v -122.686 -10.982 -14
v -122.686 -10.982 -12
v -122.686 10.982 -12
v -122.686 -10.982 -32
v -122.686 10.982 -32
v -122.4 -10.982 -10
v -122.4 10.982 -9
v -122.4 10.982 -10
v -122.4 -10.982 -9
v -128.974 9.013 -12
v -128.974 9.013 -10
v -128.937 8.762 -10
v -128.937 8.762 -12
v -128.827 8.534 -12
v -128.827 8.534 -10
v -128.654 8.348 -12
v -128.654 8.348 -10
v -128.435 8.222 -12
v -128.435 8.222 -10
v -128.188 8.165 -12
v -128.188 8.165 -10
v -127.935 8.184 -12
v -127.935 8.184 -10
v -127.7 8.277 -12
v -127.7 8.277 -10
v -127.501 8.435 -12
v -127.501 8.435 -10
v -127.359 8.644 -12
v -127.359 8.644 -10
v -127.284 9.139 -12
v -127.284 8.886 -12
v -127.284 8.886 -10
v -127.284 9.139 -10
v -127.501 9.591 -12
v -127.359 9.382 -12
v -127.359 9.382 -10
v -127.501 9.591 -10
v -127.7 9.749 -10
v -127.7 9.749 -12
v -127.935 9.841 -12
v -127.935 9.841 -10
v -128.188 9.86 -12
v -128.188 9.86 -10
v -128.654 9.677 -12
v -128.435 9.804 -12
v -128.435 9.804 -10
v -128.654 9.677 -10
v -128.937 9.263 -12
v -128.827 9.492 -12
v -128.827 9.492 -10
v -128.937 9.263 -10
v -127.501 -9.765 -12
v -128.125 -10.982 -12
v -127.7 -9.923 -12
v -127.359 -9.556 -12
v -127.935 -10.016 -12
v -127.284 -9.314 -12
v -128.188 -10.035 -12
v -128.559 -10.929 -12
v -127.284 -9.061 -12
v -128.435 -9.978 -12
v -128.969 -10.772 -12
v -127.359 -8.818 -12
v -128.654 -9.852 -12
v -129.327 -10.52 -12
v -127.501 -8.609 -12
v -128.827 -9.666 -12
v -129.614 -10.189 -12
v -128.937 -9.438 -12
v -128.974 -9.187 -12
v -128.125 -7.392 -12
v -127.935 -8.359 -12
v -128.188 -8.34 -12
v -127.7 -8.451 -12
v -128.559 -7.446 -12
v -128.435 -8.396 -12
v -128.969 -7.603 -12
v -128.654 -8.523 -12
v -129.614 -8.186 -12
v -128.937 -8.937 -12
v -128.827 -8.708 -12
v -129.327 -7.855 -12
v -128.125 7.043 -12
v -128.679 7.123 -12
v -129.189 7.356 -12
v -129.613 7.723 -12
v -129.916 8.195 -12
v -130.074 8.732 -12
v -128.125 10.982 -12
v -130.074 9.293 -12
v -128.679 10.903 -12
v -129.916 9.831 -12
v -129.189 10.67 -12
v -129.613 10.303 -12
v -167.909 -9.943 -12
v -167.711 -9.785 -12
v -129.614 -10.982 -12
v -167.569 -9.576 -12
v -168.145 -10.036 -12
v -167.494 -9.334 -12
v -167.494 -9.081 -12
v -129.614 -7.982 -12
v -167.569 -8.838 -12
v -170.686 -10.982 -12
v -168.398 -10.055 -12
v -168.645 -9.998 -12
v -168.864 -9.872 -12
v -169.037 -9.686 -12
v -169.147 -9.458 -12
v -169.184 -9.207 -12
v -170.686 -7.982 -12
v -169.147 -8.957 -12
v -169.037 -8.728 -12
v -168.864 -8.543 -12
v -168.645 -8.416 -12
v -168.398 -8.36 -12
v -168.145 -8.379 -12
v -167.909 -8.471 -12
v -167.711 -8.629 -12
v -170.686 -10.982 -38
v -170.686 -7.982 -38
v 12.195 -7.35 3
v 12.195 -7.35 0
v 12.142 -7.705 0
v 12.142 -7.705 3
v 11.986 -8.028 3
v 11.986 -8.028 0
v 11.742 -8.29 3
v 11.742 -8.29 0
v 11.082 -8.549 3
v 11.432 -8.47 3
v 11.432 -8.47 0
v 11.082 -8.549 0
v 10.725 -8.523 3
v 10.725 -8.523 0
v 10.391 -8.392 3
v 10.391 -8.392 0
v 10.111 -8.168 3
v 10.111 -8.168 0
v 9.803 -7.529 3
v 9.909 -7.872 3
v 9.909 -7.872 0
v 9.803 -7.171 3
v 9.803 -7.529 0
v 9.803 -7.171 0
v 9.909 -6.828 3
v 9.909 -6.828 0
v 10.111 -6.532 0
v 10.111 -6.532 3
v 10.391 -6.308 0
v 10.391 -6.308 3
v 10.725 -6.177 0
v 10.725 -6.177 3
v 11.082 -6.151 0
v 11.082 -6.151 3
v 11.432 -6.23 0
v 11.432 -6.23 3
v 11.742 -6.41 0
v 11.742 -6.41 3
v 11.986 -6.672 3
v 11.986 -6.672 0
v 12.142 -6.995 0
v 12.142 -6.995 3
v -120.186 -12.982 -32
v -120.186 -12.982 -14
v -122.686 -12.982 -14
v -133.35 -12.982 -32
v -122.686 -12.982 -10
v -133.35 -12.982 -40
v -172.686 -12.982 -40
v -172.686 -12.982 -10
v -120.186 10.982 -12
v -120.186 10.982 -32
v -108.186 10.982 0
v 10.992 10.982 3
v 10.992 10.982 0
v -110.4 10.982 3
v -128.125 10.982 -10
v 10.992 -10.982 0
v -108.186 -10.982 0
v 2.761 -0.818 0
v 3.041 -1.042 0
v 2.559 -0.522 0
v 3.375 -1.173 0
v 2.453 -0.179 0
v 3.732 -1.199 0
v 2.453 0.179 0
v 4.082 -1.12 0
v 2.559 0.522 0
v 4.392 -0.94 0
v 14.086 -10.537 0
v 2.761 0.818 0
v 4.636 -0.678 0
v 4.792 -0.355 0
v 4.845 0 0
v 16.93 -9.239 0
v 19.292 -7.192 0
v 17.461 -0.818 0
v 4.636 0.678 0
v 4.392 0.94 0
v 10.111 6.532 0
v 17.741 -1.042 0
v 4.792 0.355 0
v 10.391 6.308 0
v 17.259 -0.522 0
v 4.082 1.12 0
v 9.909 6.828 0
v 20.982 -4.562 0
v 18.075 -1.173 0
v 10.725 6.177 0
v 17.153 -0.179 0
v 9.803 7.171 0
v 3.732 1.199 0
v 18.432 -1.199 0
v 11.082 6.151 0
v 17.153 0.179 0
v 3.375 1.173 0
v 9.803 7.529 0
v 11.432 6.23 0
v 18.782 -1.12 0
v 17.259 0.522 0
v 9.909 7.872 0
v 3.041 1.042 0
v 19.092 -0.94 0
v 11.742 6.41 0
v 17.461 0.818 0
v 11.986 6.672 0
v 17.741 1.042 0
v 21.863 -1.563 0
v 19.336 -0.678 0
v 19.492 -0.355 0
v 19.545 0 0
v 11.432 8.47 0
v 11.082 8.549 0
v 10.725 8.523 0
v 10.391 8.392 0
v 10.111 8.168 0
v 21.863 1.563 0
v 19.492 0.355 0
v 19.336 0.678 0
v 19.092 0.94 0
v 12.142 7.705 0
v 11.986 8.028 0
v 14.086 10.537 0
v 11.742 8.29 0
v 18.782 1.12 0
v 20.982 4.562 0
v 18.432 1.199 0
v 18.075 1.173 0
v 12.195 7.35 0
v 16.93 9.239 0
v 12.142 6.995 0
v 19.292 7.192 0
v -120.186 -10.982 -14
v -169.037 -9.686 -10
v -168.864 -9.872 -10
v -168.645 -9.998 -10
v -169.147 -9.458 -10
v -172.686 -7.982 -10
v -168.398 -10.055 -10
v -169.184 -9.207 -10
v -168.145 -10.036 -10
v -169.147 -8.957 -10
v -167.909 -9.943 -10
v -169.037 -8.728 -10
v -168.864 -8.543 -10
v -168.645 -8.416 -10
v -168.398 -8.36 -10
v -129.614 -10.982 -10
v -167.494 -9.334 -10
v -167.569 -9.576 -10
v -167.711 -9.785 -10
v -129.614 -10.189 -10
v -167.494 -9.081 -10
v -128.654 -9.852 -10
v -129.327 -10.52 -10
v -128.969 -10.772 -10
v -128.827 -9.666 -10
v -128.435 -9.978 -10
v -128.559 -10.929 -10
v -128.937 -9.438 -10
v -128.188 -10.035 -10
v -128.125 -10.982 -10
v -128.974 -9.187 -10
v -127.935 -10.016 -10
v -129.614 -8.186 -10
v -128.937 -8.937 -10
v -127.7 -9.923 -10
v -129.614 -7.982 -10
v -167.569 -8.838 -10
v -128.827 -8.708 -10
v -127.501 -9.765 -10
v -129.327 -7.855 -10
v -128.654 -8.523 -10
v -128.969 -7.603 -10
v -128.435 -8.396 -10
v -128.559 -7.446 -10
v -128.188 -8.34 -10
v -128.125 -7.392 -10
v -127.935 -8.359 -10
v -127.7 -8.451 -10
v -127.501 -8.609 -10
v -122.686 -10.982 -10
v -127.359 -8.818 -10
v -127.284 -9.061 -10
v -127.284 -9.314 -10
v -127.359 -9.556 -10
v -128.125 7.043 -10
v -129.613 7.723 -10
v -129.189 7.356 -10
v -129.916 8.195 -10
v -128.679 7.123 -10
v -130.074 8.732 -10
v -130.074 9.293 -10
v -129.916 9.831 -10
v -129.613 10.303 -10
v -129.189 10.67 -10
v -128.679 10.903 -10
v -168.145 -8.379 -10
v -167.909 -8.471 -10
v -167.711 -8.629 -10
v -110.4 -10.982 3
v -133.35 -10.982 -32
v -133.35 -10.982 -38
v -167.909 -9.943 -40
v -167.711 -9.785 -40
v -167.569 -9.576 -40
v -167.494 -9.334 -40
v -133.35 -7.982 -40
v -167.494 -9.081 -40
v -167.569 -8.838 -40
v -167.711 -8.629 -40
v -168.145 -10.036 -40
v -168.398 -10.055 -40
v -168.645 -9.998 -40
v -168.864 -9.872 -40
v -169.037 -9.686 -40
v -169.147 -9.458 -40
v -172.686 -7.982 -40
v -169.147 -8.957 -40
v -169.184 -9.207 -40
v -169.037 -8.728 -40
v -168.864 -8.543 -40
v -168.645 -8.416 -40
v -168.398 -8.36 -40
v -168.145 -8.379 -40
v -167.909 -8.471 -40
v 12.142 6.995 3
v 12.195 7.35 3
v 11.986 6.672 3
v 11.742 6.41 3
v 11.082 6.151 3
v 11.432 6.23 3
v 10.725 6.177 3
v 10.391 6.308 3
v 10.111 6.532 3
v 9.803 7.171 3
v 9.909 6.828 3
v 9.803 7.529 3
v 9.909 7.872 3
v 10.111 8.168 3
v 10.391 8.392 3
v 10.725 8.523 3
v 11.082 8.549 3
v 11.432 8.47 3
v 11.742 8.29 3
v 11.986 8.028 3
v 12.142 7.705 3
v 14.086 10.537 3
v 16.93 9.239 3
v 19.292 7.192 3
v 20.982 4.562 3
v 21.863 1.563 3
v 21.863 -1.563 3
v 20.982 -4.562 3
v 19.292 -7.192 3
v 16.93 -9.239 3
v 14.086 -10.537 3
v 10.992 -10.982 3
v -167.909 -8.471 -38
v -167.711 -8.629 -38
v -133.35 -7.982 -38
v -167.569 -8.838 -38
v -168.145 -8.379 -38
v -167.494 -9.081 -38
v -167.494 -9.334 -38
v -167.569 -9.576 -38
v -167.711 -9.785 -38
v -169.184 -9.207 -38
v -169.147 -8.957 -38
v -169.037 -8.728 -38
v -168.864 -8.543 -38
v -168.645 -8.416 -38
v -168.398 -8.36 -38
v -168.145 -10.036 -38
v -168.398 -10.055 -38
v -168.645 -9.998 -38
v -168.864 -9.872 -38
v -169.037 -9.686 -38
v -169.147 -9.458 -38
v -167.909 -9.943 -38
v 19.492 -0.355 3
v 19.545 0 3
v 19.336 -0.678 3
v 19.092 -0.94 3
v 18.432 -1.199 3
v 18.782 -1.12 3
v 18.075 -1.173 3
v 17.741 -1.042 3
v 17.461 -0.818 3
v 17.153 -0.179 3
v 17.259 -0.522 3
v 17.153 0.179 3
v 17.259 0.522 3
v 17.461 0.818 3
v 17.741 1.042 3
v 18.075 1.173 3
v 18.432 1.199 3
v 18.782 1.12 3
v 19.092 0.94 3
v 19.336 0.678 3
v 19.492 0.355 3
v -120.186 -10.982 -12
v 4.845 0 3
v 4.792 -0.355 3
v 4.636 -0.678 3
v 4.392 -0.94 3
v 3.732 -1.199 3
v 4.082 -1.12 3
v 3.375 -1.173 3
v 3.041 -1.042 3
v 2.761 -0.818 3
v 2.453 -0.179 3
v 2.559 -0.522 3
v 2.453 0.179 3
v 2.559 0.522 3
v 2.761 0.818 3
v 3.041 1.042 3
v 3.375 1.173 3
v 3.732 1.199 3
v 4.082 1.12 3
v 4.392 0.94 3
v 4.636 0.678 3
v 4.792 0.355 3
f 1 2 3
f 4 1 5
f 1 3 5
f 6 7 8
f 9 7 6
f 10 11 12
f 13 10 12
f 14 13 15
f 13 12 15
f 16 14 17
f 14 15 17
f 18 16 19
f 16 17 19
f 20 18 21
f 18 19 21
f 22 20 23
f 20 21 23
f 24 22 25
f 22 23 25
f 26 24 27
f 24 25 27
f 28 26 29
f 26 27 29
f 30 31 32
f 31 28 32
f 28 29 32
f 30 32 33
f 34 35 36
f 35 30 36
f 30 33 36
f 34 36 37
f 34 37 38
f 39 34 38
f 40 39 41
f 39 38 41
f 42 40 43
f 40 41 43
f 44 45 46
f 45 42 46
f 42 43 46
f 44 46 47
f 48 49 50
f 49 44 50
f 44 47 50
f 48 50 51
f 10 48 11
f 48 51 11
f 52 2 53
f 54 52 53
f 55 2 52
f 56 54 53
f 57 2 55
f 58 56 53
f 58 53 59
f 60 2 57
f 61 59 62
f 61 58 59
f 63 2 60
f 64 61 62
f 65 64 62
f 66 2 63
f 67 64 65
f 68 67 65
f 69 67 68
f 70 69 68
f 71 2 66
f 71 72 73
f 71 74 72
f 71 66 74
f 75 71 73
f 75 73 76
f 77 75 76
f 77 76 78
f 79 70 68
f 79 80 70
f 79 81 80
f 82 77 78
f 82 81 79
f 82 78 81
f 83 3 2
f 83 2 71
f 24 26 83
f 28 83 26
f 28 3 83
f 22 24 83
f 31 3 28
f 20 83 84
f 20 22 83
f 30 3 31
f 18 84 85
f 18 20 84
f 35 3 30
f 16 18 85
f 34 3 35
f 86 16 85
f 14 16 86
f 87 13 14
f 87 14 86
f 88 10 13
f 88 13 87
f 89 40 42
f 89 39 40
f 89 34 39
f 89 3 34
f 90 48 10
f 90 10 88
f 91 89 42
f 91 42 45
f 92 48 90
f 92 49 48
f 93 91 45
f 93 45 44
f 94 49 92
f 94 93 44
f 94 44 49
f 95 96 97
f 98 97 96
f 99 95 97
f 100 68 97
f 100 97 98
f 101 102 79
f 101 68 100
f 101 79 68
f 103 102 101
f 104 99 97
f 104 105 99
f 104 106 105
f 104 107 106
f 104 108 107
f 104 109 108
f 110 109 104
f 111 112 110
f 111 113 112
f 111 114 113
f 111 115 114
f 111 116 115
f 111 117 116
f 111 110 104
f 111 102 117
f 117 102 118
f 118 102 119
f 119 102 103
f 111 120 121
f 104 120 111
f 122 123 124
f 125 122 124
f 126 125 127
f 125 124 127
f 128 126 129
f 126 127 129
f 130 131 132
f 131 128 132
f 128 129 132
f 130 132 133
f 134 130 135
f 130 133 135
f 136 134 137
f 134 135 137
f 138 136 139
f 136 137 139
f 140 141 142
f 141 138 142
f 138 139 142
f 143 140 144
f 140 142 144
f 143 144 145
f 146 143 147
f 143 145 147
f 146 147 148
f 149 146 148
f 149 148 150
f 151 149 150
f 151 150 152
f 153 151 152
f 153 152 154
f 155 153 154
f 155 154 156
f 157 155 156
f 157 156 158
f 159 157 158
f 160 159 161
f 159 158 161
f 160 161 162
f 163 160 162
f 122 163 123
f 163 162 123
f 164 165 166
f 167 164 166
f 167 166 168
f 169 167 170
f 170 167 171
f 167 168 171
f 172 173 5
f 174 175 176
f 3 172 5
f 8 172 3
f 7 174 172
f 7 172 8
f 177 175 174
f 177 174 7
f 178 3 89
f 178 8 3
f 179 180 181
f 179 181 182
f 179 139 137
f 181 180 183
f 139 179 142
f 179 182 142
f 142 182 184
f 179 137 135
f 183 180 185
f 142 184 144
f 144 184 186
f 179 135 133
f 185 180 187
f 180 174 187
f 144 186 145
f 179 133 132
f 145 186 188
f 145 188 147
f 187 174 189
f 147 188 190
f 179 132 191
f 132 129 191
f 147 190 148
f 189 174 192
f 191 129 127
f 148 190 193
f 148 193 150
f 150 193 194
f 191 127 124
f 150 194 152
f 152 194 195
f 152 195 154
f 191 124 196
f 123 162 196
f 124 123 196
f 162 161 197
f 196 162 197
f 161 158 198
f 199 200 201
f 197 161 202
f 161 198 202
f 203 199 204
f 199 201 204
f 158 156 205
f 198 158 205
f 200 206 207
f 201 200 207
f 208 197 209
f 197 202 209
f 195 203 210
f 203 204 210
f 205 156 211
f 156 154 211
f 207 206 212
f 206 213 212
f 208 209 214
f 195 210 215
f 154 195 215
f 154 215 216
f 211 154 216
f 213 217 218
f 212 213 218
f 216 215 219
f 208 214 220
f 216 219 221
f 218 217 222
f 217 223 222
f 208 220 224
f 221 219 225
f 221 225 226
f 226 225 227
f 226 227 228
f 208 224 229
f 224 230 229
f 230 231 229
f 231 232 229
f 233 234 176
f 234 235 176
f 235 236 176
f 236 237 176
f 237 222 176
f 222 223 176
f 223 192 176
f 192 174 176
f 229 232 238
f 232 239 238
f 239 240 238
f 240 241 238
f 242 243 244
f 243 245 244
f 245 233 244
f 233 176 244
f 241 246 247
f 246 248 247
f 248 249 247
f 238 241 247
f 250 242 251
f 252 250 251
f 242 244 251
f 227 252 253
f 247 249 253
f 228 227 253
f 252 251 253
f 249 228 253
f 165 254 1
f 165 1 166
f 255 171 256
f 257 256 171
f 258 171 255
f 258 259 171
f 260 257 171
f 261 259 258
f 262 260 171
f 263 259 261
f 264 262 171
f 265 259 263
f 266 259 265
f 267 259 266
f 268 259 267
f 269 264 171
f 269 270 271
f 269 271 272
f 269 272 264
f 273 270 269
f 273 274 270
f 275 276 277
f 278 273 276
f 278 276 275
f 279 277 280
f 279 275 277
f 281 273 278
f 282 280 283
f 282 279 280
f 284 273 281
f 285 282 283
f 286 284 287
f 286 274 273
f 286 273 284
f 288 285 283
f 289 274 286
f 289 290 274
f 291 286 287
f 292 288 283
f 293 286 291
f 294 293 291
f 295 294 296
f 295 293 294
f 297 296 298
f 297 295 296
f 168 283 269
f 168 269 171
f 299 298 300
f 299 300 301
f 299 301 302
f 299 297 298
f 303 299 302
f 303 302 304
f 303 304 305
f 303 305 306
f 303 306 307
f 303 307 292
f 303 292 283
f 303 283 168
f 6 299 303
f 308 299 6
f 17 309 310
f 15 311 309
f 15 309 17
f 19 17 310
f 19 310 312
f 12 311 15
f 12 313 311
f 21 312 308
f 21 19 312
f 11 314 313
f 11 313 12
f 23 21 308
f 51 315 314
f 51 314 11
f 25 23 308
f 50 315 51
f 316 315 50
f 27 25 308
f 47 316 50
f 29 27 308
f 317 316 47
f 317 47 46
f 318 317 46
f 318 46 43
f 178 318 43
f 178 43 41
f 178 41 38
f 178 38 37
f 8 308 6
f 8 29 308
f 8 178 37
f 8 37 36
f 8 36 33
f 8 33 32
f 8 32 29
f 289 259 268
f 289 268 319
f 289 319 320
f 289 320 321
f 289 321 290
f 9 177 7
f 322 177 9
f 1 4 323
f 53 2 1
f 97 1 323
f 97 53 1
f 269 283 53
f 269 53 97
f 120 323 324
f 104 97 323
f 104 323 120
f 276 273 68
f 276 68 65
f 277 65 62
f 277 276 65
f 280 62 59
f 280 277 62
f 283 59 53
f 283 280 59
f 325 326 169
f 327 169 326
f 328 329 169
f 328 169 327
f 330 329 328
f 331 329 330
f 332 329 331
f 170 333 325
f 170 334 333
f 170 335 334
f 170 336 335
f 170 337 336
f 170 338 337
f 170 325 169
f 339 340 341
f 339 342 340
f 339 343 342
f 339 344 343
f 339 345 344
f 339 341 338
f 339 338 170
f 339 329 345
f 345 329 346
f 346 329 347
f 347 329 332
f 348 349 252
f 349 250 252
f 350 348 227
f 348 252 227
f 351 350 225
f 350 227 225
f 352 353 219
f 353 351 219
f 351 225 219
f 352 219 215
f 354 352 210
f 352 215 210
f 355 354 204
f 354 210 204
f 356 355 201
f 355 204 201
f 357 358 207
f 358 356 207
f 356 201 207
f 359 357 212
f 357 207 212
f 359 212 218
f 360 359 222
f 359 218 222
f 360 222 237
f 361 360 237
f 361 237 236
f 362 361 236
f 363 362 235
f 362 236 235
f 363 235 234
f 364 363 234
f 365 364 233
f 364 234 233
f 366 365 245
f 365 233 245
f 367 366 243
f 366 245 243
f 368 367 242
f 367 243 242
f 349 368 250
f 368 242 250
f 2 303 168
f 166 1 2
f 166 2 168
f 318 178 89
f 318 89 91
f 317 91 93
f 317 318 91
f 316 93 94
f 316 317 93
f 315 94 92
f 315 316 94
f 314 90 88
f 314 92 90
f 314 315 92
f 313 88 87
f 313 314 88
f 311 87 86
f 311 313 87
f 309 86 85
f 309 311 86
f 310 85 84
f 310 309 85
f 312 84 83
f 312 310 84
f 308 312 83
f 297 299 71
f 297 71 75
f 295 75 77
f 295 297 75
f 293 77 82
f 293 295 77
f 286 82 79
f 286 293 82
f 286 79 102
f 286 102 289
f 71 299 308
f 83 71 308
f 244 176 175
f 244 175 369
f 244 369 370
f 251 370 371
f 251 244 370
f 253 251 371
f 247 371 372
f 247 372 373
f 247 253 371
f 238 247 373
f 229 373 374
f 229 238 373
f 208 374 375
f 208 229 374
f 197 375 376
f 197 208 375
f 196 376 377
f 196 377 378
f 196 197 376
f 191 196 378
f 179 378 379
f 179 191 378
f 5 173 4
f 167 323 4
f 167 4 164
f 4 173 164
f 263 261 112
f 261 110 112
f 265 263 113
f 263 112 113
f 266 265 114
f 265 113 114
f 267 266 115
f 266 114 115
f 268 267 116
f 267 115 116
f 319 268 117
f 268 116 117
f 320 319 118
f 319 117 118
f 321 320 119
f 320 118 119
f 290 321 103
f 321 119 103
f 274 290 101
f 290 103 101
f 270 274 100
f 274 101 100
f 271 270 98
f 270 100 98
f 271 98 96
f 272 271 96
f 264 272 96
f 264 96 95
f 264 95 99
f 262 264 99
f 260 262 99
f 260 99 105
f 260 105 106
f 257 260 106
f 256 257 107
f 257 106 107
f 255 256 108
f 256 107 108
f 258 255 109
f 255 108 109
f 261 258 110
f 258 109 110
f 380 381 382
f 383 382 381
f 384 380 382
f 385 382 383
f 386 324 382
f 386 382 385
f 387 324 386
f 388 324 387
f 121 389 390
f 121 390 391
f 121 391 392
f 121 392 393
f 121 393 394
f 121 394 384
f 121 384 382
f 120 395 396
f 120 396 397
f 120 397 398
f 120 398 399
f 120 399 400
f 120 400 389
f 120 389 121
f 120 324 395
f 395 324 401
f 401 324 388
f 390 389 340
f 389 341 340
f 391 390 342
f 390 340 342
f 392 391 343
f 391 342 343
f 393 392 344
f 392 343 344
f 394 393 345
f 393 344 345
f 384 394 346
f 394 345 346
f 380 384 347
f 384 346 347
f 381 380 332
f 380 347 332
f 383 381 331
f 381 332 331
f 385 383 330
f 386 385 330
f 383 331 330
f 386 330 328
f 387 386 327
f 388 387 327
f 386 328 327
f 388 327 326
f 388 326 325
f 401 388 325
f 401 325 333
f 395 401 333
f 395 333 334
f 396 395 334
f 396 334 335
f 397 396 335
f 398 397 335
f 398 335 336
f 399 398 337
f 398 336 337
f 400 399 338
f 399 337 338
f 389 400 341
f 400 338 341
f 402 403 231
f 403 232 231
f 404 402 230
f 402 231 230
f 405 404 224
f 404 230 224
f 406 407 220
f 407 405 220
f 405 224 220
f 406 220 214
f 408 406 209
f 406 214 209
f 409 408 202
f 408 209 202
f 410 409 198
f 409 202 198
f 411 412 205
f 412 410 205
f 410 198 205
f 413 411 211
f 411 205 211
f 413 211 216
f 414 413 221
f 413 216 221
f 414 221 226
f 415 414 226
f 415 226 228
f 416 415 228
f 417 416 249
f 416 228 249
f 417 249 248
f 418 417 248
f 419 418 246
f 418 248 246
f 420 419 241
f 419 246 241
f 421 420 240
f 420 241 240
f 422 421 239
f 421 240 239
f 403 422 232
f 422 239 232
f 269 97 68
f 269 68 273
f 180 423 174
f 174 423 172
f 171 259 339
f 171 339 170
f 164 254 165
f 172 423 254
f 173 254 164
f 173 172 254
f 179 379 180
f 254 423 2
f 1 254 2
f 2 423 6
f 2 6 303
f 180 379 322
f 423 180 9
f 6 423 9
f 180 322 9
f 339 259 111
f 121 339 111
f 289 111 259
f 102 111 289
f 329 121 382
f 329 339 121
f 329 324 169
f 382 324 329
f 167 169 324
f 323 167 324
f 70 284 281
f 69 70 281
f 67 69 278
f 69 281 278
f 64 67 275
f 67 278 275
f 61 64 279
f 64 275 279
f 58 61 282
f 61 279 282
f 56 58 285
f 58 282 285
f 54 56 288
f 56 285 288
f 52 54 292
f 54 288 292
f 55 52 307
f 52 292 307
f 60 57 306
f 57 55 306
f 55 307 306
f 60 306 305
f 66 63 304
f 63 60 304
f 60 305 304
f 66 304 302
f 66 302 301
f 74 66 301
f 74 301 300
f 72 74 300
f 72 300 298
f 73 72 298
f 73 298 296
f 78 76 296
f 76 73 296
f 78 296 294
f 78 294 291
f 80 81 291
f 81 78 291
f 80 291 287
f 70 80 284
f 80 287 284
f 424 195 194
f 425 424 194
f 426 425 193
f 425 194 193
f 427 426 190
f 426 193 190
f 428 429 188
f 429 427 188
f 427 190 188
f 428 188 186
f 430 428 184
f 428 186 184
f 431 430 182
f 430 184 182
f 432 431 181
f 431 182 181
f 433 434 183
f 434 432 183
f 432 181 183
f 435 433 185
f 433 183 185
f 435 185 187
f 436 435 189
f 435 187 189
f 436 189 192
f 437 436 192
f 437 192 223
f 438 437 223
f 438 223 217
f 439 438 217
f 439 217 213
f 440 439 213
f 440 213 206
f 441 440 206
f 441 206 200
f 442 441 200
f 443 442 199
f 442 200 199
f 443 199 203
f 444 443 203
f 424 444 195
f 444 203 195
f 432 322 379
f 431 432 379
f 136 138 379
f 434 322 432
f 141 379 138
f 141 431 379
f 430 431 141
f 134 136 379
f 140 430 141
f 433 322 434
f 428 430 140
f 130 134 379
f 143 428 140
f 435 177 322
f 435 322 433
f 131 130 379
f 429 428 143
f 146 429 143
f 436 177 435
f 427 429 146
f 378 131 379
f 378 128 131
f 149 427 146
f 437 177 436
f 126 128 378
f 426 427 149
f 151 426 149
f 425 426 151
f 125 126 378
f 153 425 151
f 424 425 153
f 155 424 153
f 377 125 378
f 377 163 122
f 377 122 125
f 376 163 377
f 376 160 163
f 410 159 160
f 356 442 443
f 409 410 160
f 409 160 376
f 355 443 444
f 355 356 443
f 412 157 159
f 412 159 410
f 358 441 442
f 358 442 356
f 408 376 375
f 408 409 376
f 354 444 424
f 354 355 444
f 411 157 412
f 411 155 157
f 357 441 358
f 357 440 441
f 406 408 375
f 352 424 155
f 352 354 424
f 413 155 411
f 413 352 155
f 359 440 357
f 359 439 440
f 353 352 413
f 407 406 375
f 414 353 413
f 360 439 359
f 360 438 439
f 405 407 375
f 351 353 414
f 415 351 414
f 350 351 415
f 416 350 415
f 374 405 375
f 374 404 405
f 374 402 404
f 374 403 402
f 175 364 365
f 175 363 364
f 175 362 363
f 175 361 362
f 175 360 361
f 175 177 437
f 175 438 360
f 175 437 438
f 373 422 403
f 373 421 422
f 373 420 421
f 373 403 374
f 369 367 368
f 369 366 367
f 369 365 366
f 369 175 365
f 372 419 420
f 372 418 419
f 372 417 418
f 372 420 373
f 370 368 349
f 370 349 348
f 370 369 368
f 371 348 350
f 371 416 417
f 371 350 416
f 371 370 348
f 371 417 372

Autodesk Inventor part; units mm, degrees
ref_plane "YZ Plane" through (0, 0, 0) normal (1, 0, 0) x (0, 1, 0)
ref_plane "XZ Plane" through (0, 0, 0) normal (0, 1, 0) x (-1, 0, 0)
ref_plane "XY Plane" through (0, 0, 0) normal (0, 0, 1) x (1, 0, 0)
ref_plane "Plano de trabajo1" through (0, 0, 0) normal (0, 0, 1) x (1, 0, 0)
sketch "Boceto1" plane through (0, 0, 0) normal (0, 0, 1) x (1, 0, 0)
  circle A0 centre (10.9923, -7.35) radius 1.2028 projected
  circle A1 centre (3.6423, 0) radius 1.2028 projected
  circle A2 centre (18.3423, 0) radius 1.2028 projected
  circle A3 centre (10.9923, 7.35) radius 1.2028 projected
  circle A4 centre (10.9923, 0) radius 10.9823 projected
  line L0 (10.9923, -10.9823) -> (-139.0077, -10.9823)
  line L1 (10.9923, 10.9823) -> (-139.0077, 10.9823)
  line L2 (-139.0077, 10.9823) -> (-139.0077, -10.9823)
  point P0 (0, 0)
  dimension "d0" = 150
  dimension "d1" = 150
extrude "Extrusión1" add sketch "Boceto1" along normal blind 3
sketch "Boceto2" plane through (0, 0, 3) normal (0, 0, 1) x (1, 0, 0)
  arc A0 (-129.1978, -5.6745) -> (-132.1454, -8.5217) centre (-128.1245, -9.7351) ccw
  circle A1 centre (-128.1245, 8.4649) radius 0.85 construction
  circle A2 centre (-128.1245, -9.7351) radius 0.7049 construction
  line L0 (-139.0305, -11.0697) -> (-267.2186, 10.8953)
  line L1 (-267.2186, -11.0694) -> (-117.2186, -11.0694)
  line L2 (-139.0305, 10.8953) -> (-139.0305, -11.0694)
  line L3 (-117.2186, 10.8953) -> (-267.2186, 10.8953)
  line L4 (-128.1245, -11.0697) -> (-128.1245, -0.0872)
  line L5 (-128.1245, -0.0872) -> (-128.1245, 9.0128)
  line L6 (-128.1245, -0.0872) -> (-128.1245, -9.1872)
  circle A3 centre (-128.1245, -9.1872) radius 0.85
  circle A4 centre (-128.1245, 9.0128) radius 0.85
  circle A5 centre (-128.1245, -9.1872) radius 1.8825
  circle A6 centre (-128.1245, 9.0128) radius 1.8821
  circle A7 centre (-128.1245, 9.0128) radius 0.85
  circle A8 centre (-128.1245, -9.1872) radius 0.85
  line L7 (-128.1245, 10.8953) -> (-139.0305, 10.8953)
  line L8 (-139.0077, 10.9823) -> (-139.0077, -10.9823) projected
  line L9 (-139.0077, -10.9823) -> (-139.0077, 10.9823)
  line L10 (-139.0077, 10.9823) -> (-139.0077, -10.9823)
  point P0 (0, 0)
  dimension "d4" = 10.9825
  dimension "d5" = 9.1
  dimension "d6" = 9.1
  dimension "d7" = 1.7
  dimension "d8" = 1.7
extrude "Extrusión2" cut sketch "Boceto2" against normal blind 3 contours A3 L4 | L4 A3 | A4
sketch "Boceto3" plane through (0, 0, 3) normal (0, 0, 1) x (1, 0, 0)
  circle A0 centre (-128.1245, -9.1872) radius 0.85 projected
  circle A1 centre (-128.1245, 9.0128) radius 0.85 projected
  line L0 (10.9923, 10.9823) -> (-139.0077, 10.9823) projected
  line L1 (-139.0077, 10.9823) -> (-139.0077, -10.9823) projected
  line L2 (-139.0077, -10.9823) -> (10.9923, -10.9823) projected
  arc A2 (10.9923, -10.9823) -> (10.9923, 10.9823) centre (10.9923, 0) ccw projected
  circle A3 centre (10.9923, -7.35) radius 1.2028 projected
  circle A4 centre (3.6423, 0) radius 1.2028 projected
  circle A5 centre (18.3423, 0) radius 1.2028 projected
  circle A6 centre (10.9923, 7.35) radius 1.2028 projected
  line L3 (-130.1442, 5.5225) -> (-129.5361, 14.2169) projected
  circle A7 centre (-128.1245, -9.1872) radius 1.7951
  circle A8 centre (-128.1245, 9.0128) radius 1.9695
  line L4 (-128.1245, -7.3921) -> (-128.1245, 7.0432)
  line L5 (-128.1245, -10.9823) -> (-128.1245, -18.0451)
  line L6 (-128.1245, -18.0451) -> (-142.6221, -18.554)
  line L7 (-142.6221, -18.554) -> (-141.7315, 12.8288)
  line L8 (-141.7315, 12.8288) -> (-128.1245, 12.4426)
  line L9 (-128.1245, 12.4426) -> (-128.1245, 10.9823)
  point P0 (0, 0)
extrude "Extrusión3" cut sketch "Boceto3" against normal blind 3 contours A8 L3 L0 | L3 A8 L4 A7 L2 L1 L0
sketch "Boceto4" plane through (0, 0, 0) normal (0, 0, -1) x (-1, 0, 0)
  arc A0 (128.1245, 7.0432) -> (128.1245, 10.9823) centre (128.1245, 9.0128) ccw projected
  line L0 (-10.9923, 10.9823) -> (128.1245, 10.9823) projected
  arc A1 (-10.9923, 10.9823) -> (-10.9923, -10.9823) centre (-10.9923, 0) ccw projected
  line L1 (128.1245, -10.9823) -> (-10.9923, -10.9823) projected
  arc A2 (128.1245, -10.9823) -> (128.1245, -7.3921) centre (128.1245, -9.1872) ccw projected
  line L2 (128.1245, -7.3921) -> (128.1245, 7.0432) projected
  circle A3 centre (128.1245, -9.1872) radius 0.85 projected
  circle A4 centre (128.1245, 9.0128) radius 0.85 projected
  circle A5 centre (-10.9923, -7.35) radius 1.2028 projected
  circle A6 centre (-3.6423, 0) radius 1.2028 projected
  circle A7 centre (-18.3423, 0) radius 1.2028 projected
  circle A8 centre (-10.9923, 7.35) radius 1.2028 projected
  line L3 (108.1857, 10.9823) -> (108.1857, -10.9823)
  point P0 (0, 0)
extrude "Extrusión4" add sketch "Boceto4" along normal blind 12 contours L2 A2 L1 L3 L0 A0
sketch "Boceto5" plane through (0, 0, 3) normal (0, 0, 1) x (1, 0, 0)
  line L0 (-108.1857, -10.9823) -> (-108.1857, 10.9823) projected
  circle A0 centre (10.9923, 7.35) radius 1.2028 projected
  circle A1 centre (18.3423, 0) radius 1.2028 projected
  circle A2 centre (3.6423, 0) radius 1.2028 projected
  circle A3 centre (10.9923, -7.35) radius 1.2028 projected
  arc A4 (-128.1245, 10.9823) -> (-128.1245, 7.0432) centre (-128.1245, 9.0128) ccw projected
  line L1 (-128.1245, 7.0432) -> (-128.1245, -7.3921) projected
  arc A5 (-128.1245, -7.3921) -> (-128.1245, -10.9823) centre (-128.1245, -9.1872) ccw projected
  line L2 (-128.1245, -10.9823) -> (10.9923, -10.9823) projected
  arc A6 (10.9923, -10.9823) -> (10.9923, 10.9823) centre (10.9923, 0) ccw projected
  line L3 (10.9923, 10.9823) -> (-128.1245, 10.9823) projected
  circle A7 centre (-128.1245, 9.0128) radius 0.85 projected
  circle A8 centre (-128.1245, -9.1872) radius 0.85 projected
  line L4 (-108.1857, 10.9823) -> (-111.1857, 10.9823)
  line L5 (-111.1857, 10.9823) -> (-111.1857, -10.9823)
  line L6 (-111.1857, -10.9823) -> (-108.1857, -10.9823)
  line L7 (-108.1857, -10.9823) -> (-108.1857, 10.9823)
  line L8 (10.9923, 10.9823) -> (-128.1245, 10.9823) projected
  line L9 (-122.3999, 10.9823) -> (-122.3999, -10.9823)
  point P0 (0, 0)
  dimension "d15" = 3
extrude "Extrusión5" cut sketch "Boceto5" against normal blind 13 contours L2 A5 L1 A4 L3 L9
chamfer "Chaflán1" distance 12 angle 45 1 edges at (-122.3999, 0, 3)
chamfer "Chaflán2" distance 12 angle 45 1 edges at (-108.1857, 0, -12)
sketch "Boceto6" plane through (0, 0, -12) normal (0, 0, -1) x (-1, 0, 0)
  line L0 (126.0445, -11.1372) -> (126.0445, 10.9228)
  line L1 (120.1857, -10.9823) -> (120.1857, 10.9823) projected
  line L2 (120.1857, -10.9823) -> (128.1245, -10.9823) projected
  line L3 (120.1857, 10.9823) -> (122.6857, 10.9823)
  line L4 (122.6857, 10.9823) -> (122.6857, -10.9823)
  line L5 (122.6857, -10.9823) -> (120.1857, -10.9823)
  line L6 (120.1857, -10.9823) -> (120.1857, 10.9823)
  point P0 (0, 0)
  dimension "d24" = 2.5
extrude "Extrusión6" add sketch "Boceto6" along normal blind 20
sketch "Boceto7" plane through (-128.1245, -10.9823, -10) normal (0, -1, 0) x (1, 0, 0)
  line L0 (19.9388, 10) -> (7.9388, -2) projected
  line L1 (19.9388, 10) -> (139.1168, 10) projected
  line L2 (139.1168, 10) -> (139.1168, 13) projected
  line L3 (17.7246, 13) -> (139.1168, 13) projected
  line L4 (5.7246, 1) -> (17.7246, 13) projected
  line L5 (5.7246, 1) -> (5.7246, 0) projected
  line L6 (5.7246, 0) -> (0, 0) projected
  line L7 (0, 0) -> (0, -2) projected
  line L8 (5.4388, -2) -> (0, -2) projected
  line L9 (5.4388, -2) -> (5.4388, -22) projected
  line L10 (7.9388, -22) -> (5.4388, -22) projected
  line L11 (7.9388, -2) -> (7.9388, -22) projected
  line L12 (7.9388, -2) -> (7.9388, -22) projected
  line L13 (5.4388, -22) -> (7.9388, -22)
  line L14 (7.9388, -22) -> (7.9388, -4)
  line L15 (7.9388, -4) -> (5.4388, -4)
  line L16 (5.4388, -4) -> (5.4388, -22)
  point P0 (128.1245, 10)
  point P1 (5.4388, -4)
  dimension "d27" = 18
extrude "Extrusión7" add sketch "Boceto7" along normal blind 2 contours L11 L10 L9 L15
sketch "Boceto8" plane through (-122.6857, -10.9823, -12) normal (-1, 0, 0) x (0, 0, 1)
  line L0 (0, 21.9646) -> (0, 0) projected
  line L1 (0, 21.9646) -> (-20, 21.9646) projected
  line L2 (-20, 21.9646) -> (-20, -2) projected
  line L3 (-2, -2) -> (-20, -2) projected
  line L4 (-2, 0) -> (-2, -2) projected
  line L5 (0, 0) -> (-2, 0) projected
  line L6 (-20, 0) -> (-2, 0)
  point P0 (12, 10.9823)
extrude "Extrusión8" add sketch "Boceto8" along normal blind 50 contours L4 L3 L2 L6
sketch "Boceto9" plane through (-120.1857, -12.9823, -14) normal (0, 0, 1) x (1, 0, 0)
  line L0 (-2.5, 2) -> (0, 2) projected
  line L1 (-2.5, 2) -> (-52.5, 2) projected
  line L2 (-52.5, 0) -> (-52.5, 2) projected
  line L3 (0, 0) -> (-52.5, 0) projected
  line L4 (0, 2) -> (0, 0) projected
  line L5 (-2.5, 0) -> (-52.5, 0)
  line L6 (-52.5, 0) -> (-52.5, 2)
  line L7 (-52.5, 2) -> (-2.5, 2)
  line L8 (-2.5, 2) -> (-2.5, 0)
  point P0 (120.1857, 12.9823)
extrude "Extrusión9" add sketch "Boceto9" along normal blind 4 contours L8 L3 L2 L1
sketch "Boceto10" plane through (0, 0, -32) normal (0, 0, -1) x (-1, 0, 0)
  line L0 (120.1857, 10.9823) -> (120.1857, -12.9823) projected
  line L1 (120.1857, -12.9823) -> (172.6857, -12.9823) projected
  line L2 (172.6857, -10.9823) -> (172.6857, -12.9823) projected
  line L3 (122.6857, -10.9823) -> (172.6857, -10.9823) projected
  line L4 (122.6857, 10.9823) -> (122.6857, -10.9823) projected
  line L5 (122.6857, 10.9823) -> (120.1857, 10.9823) projected
  line L6 (133.3495, -12.9823) -> (133.3495, -10.9823)
  line L7 (128.1245, -10.9823) -> (172.6857, -10.9823) projected
  point P0 (0, 0)
extrude "Extrusión10" add sketch "Boceto10" along normal blind 8 contours L6 L3 L2 L1
sketch "Boceto11" plane through (-172.6857, -10.9823, -10) normal (0, 1, 0) x (1, 0, 0)
  line L0 (50, 22) -> (50, 4) projected
  line L1 (50, 22) -> (39.3362, 22) projected
  line L2 (39.3362, 22) -> (39.3362, 30) projected
  line L3 (0, 30) -> (39.3362, 30) projected
  line L4 (0, 30) -> (0, 0) projected
  line L5 (44.5612, 0) -> (0, 0) projected
  line L6 (44.5612, 0) -> (44.5612, 2) projected
  line L7 (50, 2) -> (44.5612, 2) projected
  line L8 (50, 2) -> (50, 4) projected
  line L9 (39.3362, 22) -> (39.3362, 30) projected
  line L10 (39.3362, 30) -> (39.3362, 28)
  line L11 (39.3362, 28) -> (0, 28)
  line L12 (0, 28) -> (2, 28)
  line L13 (2, 28) -> (2, 0)
  line L14 (0, 0) -> (0, 30) projected
  line L15 (0, 0) -> (0, 2)
  line L16 (0, 2) -> (43.0714, 2)
  line L17 (43.0714, 2) -> (43.0714, 0)
  line L18 (44.5612, 0) -> (0, 0) projected
  point P0 (172.6857, -10)
  point P1 (2, 2)
  point P2 (39.3362, 28)
  dimension "d36" = 2
  dimension "d37" = 2
  dimension "d38" = 2
extrude "Extrusión11" add sketch "Boceto11" along normal blind 3 contours L11 L4 L3 L2 | L13 L16 L4 L11 | L16 L17 L5 L13 | L13 L5 L4 L16
sketch "Boceto12" plane through (0, 0, -40) normal (0, 0, -1) x (-1, 0, 0)
  circle A0 centre (168.3345, -9.2072) radius 0.85
  point P0 (0, 0)
extrude "Extrusión12" cut sketch "Boceto12" against normal blind 35
properties part number "femurAux"
